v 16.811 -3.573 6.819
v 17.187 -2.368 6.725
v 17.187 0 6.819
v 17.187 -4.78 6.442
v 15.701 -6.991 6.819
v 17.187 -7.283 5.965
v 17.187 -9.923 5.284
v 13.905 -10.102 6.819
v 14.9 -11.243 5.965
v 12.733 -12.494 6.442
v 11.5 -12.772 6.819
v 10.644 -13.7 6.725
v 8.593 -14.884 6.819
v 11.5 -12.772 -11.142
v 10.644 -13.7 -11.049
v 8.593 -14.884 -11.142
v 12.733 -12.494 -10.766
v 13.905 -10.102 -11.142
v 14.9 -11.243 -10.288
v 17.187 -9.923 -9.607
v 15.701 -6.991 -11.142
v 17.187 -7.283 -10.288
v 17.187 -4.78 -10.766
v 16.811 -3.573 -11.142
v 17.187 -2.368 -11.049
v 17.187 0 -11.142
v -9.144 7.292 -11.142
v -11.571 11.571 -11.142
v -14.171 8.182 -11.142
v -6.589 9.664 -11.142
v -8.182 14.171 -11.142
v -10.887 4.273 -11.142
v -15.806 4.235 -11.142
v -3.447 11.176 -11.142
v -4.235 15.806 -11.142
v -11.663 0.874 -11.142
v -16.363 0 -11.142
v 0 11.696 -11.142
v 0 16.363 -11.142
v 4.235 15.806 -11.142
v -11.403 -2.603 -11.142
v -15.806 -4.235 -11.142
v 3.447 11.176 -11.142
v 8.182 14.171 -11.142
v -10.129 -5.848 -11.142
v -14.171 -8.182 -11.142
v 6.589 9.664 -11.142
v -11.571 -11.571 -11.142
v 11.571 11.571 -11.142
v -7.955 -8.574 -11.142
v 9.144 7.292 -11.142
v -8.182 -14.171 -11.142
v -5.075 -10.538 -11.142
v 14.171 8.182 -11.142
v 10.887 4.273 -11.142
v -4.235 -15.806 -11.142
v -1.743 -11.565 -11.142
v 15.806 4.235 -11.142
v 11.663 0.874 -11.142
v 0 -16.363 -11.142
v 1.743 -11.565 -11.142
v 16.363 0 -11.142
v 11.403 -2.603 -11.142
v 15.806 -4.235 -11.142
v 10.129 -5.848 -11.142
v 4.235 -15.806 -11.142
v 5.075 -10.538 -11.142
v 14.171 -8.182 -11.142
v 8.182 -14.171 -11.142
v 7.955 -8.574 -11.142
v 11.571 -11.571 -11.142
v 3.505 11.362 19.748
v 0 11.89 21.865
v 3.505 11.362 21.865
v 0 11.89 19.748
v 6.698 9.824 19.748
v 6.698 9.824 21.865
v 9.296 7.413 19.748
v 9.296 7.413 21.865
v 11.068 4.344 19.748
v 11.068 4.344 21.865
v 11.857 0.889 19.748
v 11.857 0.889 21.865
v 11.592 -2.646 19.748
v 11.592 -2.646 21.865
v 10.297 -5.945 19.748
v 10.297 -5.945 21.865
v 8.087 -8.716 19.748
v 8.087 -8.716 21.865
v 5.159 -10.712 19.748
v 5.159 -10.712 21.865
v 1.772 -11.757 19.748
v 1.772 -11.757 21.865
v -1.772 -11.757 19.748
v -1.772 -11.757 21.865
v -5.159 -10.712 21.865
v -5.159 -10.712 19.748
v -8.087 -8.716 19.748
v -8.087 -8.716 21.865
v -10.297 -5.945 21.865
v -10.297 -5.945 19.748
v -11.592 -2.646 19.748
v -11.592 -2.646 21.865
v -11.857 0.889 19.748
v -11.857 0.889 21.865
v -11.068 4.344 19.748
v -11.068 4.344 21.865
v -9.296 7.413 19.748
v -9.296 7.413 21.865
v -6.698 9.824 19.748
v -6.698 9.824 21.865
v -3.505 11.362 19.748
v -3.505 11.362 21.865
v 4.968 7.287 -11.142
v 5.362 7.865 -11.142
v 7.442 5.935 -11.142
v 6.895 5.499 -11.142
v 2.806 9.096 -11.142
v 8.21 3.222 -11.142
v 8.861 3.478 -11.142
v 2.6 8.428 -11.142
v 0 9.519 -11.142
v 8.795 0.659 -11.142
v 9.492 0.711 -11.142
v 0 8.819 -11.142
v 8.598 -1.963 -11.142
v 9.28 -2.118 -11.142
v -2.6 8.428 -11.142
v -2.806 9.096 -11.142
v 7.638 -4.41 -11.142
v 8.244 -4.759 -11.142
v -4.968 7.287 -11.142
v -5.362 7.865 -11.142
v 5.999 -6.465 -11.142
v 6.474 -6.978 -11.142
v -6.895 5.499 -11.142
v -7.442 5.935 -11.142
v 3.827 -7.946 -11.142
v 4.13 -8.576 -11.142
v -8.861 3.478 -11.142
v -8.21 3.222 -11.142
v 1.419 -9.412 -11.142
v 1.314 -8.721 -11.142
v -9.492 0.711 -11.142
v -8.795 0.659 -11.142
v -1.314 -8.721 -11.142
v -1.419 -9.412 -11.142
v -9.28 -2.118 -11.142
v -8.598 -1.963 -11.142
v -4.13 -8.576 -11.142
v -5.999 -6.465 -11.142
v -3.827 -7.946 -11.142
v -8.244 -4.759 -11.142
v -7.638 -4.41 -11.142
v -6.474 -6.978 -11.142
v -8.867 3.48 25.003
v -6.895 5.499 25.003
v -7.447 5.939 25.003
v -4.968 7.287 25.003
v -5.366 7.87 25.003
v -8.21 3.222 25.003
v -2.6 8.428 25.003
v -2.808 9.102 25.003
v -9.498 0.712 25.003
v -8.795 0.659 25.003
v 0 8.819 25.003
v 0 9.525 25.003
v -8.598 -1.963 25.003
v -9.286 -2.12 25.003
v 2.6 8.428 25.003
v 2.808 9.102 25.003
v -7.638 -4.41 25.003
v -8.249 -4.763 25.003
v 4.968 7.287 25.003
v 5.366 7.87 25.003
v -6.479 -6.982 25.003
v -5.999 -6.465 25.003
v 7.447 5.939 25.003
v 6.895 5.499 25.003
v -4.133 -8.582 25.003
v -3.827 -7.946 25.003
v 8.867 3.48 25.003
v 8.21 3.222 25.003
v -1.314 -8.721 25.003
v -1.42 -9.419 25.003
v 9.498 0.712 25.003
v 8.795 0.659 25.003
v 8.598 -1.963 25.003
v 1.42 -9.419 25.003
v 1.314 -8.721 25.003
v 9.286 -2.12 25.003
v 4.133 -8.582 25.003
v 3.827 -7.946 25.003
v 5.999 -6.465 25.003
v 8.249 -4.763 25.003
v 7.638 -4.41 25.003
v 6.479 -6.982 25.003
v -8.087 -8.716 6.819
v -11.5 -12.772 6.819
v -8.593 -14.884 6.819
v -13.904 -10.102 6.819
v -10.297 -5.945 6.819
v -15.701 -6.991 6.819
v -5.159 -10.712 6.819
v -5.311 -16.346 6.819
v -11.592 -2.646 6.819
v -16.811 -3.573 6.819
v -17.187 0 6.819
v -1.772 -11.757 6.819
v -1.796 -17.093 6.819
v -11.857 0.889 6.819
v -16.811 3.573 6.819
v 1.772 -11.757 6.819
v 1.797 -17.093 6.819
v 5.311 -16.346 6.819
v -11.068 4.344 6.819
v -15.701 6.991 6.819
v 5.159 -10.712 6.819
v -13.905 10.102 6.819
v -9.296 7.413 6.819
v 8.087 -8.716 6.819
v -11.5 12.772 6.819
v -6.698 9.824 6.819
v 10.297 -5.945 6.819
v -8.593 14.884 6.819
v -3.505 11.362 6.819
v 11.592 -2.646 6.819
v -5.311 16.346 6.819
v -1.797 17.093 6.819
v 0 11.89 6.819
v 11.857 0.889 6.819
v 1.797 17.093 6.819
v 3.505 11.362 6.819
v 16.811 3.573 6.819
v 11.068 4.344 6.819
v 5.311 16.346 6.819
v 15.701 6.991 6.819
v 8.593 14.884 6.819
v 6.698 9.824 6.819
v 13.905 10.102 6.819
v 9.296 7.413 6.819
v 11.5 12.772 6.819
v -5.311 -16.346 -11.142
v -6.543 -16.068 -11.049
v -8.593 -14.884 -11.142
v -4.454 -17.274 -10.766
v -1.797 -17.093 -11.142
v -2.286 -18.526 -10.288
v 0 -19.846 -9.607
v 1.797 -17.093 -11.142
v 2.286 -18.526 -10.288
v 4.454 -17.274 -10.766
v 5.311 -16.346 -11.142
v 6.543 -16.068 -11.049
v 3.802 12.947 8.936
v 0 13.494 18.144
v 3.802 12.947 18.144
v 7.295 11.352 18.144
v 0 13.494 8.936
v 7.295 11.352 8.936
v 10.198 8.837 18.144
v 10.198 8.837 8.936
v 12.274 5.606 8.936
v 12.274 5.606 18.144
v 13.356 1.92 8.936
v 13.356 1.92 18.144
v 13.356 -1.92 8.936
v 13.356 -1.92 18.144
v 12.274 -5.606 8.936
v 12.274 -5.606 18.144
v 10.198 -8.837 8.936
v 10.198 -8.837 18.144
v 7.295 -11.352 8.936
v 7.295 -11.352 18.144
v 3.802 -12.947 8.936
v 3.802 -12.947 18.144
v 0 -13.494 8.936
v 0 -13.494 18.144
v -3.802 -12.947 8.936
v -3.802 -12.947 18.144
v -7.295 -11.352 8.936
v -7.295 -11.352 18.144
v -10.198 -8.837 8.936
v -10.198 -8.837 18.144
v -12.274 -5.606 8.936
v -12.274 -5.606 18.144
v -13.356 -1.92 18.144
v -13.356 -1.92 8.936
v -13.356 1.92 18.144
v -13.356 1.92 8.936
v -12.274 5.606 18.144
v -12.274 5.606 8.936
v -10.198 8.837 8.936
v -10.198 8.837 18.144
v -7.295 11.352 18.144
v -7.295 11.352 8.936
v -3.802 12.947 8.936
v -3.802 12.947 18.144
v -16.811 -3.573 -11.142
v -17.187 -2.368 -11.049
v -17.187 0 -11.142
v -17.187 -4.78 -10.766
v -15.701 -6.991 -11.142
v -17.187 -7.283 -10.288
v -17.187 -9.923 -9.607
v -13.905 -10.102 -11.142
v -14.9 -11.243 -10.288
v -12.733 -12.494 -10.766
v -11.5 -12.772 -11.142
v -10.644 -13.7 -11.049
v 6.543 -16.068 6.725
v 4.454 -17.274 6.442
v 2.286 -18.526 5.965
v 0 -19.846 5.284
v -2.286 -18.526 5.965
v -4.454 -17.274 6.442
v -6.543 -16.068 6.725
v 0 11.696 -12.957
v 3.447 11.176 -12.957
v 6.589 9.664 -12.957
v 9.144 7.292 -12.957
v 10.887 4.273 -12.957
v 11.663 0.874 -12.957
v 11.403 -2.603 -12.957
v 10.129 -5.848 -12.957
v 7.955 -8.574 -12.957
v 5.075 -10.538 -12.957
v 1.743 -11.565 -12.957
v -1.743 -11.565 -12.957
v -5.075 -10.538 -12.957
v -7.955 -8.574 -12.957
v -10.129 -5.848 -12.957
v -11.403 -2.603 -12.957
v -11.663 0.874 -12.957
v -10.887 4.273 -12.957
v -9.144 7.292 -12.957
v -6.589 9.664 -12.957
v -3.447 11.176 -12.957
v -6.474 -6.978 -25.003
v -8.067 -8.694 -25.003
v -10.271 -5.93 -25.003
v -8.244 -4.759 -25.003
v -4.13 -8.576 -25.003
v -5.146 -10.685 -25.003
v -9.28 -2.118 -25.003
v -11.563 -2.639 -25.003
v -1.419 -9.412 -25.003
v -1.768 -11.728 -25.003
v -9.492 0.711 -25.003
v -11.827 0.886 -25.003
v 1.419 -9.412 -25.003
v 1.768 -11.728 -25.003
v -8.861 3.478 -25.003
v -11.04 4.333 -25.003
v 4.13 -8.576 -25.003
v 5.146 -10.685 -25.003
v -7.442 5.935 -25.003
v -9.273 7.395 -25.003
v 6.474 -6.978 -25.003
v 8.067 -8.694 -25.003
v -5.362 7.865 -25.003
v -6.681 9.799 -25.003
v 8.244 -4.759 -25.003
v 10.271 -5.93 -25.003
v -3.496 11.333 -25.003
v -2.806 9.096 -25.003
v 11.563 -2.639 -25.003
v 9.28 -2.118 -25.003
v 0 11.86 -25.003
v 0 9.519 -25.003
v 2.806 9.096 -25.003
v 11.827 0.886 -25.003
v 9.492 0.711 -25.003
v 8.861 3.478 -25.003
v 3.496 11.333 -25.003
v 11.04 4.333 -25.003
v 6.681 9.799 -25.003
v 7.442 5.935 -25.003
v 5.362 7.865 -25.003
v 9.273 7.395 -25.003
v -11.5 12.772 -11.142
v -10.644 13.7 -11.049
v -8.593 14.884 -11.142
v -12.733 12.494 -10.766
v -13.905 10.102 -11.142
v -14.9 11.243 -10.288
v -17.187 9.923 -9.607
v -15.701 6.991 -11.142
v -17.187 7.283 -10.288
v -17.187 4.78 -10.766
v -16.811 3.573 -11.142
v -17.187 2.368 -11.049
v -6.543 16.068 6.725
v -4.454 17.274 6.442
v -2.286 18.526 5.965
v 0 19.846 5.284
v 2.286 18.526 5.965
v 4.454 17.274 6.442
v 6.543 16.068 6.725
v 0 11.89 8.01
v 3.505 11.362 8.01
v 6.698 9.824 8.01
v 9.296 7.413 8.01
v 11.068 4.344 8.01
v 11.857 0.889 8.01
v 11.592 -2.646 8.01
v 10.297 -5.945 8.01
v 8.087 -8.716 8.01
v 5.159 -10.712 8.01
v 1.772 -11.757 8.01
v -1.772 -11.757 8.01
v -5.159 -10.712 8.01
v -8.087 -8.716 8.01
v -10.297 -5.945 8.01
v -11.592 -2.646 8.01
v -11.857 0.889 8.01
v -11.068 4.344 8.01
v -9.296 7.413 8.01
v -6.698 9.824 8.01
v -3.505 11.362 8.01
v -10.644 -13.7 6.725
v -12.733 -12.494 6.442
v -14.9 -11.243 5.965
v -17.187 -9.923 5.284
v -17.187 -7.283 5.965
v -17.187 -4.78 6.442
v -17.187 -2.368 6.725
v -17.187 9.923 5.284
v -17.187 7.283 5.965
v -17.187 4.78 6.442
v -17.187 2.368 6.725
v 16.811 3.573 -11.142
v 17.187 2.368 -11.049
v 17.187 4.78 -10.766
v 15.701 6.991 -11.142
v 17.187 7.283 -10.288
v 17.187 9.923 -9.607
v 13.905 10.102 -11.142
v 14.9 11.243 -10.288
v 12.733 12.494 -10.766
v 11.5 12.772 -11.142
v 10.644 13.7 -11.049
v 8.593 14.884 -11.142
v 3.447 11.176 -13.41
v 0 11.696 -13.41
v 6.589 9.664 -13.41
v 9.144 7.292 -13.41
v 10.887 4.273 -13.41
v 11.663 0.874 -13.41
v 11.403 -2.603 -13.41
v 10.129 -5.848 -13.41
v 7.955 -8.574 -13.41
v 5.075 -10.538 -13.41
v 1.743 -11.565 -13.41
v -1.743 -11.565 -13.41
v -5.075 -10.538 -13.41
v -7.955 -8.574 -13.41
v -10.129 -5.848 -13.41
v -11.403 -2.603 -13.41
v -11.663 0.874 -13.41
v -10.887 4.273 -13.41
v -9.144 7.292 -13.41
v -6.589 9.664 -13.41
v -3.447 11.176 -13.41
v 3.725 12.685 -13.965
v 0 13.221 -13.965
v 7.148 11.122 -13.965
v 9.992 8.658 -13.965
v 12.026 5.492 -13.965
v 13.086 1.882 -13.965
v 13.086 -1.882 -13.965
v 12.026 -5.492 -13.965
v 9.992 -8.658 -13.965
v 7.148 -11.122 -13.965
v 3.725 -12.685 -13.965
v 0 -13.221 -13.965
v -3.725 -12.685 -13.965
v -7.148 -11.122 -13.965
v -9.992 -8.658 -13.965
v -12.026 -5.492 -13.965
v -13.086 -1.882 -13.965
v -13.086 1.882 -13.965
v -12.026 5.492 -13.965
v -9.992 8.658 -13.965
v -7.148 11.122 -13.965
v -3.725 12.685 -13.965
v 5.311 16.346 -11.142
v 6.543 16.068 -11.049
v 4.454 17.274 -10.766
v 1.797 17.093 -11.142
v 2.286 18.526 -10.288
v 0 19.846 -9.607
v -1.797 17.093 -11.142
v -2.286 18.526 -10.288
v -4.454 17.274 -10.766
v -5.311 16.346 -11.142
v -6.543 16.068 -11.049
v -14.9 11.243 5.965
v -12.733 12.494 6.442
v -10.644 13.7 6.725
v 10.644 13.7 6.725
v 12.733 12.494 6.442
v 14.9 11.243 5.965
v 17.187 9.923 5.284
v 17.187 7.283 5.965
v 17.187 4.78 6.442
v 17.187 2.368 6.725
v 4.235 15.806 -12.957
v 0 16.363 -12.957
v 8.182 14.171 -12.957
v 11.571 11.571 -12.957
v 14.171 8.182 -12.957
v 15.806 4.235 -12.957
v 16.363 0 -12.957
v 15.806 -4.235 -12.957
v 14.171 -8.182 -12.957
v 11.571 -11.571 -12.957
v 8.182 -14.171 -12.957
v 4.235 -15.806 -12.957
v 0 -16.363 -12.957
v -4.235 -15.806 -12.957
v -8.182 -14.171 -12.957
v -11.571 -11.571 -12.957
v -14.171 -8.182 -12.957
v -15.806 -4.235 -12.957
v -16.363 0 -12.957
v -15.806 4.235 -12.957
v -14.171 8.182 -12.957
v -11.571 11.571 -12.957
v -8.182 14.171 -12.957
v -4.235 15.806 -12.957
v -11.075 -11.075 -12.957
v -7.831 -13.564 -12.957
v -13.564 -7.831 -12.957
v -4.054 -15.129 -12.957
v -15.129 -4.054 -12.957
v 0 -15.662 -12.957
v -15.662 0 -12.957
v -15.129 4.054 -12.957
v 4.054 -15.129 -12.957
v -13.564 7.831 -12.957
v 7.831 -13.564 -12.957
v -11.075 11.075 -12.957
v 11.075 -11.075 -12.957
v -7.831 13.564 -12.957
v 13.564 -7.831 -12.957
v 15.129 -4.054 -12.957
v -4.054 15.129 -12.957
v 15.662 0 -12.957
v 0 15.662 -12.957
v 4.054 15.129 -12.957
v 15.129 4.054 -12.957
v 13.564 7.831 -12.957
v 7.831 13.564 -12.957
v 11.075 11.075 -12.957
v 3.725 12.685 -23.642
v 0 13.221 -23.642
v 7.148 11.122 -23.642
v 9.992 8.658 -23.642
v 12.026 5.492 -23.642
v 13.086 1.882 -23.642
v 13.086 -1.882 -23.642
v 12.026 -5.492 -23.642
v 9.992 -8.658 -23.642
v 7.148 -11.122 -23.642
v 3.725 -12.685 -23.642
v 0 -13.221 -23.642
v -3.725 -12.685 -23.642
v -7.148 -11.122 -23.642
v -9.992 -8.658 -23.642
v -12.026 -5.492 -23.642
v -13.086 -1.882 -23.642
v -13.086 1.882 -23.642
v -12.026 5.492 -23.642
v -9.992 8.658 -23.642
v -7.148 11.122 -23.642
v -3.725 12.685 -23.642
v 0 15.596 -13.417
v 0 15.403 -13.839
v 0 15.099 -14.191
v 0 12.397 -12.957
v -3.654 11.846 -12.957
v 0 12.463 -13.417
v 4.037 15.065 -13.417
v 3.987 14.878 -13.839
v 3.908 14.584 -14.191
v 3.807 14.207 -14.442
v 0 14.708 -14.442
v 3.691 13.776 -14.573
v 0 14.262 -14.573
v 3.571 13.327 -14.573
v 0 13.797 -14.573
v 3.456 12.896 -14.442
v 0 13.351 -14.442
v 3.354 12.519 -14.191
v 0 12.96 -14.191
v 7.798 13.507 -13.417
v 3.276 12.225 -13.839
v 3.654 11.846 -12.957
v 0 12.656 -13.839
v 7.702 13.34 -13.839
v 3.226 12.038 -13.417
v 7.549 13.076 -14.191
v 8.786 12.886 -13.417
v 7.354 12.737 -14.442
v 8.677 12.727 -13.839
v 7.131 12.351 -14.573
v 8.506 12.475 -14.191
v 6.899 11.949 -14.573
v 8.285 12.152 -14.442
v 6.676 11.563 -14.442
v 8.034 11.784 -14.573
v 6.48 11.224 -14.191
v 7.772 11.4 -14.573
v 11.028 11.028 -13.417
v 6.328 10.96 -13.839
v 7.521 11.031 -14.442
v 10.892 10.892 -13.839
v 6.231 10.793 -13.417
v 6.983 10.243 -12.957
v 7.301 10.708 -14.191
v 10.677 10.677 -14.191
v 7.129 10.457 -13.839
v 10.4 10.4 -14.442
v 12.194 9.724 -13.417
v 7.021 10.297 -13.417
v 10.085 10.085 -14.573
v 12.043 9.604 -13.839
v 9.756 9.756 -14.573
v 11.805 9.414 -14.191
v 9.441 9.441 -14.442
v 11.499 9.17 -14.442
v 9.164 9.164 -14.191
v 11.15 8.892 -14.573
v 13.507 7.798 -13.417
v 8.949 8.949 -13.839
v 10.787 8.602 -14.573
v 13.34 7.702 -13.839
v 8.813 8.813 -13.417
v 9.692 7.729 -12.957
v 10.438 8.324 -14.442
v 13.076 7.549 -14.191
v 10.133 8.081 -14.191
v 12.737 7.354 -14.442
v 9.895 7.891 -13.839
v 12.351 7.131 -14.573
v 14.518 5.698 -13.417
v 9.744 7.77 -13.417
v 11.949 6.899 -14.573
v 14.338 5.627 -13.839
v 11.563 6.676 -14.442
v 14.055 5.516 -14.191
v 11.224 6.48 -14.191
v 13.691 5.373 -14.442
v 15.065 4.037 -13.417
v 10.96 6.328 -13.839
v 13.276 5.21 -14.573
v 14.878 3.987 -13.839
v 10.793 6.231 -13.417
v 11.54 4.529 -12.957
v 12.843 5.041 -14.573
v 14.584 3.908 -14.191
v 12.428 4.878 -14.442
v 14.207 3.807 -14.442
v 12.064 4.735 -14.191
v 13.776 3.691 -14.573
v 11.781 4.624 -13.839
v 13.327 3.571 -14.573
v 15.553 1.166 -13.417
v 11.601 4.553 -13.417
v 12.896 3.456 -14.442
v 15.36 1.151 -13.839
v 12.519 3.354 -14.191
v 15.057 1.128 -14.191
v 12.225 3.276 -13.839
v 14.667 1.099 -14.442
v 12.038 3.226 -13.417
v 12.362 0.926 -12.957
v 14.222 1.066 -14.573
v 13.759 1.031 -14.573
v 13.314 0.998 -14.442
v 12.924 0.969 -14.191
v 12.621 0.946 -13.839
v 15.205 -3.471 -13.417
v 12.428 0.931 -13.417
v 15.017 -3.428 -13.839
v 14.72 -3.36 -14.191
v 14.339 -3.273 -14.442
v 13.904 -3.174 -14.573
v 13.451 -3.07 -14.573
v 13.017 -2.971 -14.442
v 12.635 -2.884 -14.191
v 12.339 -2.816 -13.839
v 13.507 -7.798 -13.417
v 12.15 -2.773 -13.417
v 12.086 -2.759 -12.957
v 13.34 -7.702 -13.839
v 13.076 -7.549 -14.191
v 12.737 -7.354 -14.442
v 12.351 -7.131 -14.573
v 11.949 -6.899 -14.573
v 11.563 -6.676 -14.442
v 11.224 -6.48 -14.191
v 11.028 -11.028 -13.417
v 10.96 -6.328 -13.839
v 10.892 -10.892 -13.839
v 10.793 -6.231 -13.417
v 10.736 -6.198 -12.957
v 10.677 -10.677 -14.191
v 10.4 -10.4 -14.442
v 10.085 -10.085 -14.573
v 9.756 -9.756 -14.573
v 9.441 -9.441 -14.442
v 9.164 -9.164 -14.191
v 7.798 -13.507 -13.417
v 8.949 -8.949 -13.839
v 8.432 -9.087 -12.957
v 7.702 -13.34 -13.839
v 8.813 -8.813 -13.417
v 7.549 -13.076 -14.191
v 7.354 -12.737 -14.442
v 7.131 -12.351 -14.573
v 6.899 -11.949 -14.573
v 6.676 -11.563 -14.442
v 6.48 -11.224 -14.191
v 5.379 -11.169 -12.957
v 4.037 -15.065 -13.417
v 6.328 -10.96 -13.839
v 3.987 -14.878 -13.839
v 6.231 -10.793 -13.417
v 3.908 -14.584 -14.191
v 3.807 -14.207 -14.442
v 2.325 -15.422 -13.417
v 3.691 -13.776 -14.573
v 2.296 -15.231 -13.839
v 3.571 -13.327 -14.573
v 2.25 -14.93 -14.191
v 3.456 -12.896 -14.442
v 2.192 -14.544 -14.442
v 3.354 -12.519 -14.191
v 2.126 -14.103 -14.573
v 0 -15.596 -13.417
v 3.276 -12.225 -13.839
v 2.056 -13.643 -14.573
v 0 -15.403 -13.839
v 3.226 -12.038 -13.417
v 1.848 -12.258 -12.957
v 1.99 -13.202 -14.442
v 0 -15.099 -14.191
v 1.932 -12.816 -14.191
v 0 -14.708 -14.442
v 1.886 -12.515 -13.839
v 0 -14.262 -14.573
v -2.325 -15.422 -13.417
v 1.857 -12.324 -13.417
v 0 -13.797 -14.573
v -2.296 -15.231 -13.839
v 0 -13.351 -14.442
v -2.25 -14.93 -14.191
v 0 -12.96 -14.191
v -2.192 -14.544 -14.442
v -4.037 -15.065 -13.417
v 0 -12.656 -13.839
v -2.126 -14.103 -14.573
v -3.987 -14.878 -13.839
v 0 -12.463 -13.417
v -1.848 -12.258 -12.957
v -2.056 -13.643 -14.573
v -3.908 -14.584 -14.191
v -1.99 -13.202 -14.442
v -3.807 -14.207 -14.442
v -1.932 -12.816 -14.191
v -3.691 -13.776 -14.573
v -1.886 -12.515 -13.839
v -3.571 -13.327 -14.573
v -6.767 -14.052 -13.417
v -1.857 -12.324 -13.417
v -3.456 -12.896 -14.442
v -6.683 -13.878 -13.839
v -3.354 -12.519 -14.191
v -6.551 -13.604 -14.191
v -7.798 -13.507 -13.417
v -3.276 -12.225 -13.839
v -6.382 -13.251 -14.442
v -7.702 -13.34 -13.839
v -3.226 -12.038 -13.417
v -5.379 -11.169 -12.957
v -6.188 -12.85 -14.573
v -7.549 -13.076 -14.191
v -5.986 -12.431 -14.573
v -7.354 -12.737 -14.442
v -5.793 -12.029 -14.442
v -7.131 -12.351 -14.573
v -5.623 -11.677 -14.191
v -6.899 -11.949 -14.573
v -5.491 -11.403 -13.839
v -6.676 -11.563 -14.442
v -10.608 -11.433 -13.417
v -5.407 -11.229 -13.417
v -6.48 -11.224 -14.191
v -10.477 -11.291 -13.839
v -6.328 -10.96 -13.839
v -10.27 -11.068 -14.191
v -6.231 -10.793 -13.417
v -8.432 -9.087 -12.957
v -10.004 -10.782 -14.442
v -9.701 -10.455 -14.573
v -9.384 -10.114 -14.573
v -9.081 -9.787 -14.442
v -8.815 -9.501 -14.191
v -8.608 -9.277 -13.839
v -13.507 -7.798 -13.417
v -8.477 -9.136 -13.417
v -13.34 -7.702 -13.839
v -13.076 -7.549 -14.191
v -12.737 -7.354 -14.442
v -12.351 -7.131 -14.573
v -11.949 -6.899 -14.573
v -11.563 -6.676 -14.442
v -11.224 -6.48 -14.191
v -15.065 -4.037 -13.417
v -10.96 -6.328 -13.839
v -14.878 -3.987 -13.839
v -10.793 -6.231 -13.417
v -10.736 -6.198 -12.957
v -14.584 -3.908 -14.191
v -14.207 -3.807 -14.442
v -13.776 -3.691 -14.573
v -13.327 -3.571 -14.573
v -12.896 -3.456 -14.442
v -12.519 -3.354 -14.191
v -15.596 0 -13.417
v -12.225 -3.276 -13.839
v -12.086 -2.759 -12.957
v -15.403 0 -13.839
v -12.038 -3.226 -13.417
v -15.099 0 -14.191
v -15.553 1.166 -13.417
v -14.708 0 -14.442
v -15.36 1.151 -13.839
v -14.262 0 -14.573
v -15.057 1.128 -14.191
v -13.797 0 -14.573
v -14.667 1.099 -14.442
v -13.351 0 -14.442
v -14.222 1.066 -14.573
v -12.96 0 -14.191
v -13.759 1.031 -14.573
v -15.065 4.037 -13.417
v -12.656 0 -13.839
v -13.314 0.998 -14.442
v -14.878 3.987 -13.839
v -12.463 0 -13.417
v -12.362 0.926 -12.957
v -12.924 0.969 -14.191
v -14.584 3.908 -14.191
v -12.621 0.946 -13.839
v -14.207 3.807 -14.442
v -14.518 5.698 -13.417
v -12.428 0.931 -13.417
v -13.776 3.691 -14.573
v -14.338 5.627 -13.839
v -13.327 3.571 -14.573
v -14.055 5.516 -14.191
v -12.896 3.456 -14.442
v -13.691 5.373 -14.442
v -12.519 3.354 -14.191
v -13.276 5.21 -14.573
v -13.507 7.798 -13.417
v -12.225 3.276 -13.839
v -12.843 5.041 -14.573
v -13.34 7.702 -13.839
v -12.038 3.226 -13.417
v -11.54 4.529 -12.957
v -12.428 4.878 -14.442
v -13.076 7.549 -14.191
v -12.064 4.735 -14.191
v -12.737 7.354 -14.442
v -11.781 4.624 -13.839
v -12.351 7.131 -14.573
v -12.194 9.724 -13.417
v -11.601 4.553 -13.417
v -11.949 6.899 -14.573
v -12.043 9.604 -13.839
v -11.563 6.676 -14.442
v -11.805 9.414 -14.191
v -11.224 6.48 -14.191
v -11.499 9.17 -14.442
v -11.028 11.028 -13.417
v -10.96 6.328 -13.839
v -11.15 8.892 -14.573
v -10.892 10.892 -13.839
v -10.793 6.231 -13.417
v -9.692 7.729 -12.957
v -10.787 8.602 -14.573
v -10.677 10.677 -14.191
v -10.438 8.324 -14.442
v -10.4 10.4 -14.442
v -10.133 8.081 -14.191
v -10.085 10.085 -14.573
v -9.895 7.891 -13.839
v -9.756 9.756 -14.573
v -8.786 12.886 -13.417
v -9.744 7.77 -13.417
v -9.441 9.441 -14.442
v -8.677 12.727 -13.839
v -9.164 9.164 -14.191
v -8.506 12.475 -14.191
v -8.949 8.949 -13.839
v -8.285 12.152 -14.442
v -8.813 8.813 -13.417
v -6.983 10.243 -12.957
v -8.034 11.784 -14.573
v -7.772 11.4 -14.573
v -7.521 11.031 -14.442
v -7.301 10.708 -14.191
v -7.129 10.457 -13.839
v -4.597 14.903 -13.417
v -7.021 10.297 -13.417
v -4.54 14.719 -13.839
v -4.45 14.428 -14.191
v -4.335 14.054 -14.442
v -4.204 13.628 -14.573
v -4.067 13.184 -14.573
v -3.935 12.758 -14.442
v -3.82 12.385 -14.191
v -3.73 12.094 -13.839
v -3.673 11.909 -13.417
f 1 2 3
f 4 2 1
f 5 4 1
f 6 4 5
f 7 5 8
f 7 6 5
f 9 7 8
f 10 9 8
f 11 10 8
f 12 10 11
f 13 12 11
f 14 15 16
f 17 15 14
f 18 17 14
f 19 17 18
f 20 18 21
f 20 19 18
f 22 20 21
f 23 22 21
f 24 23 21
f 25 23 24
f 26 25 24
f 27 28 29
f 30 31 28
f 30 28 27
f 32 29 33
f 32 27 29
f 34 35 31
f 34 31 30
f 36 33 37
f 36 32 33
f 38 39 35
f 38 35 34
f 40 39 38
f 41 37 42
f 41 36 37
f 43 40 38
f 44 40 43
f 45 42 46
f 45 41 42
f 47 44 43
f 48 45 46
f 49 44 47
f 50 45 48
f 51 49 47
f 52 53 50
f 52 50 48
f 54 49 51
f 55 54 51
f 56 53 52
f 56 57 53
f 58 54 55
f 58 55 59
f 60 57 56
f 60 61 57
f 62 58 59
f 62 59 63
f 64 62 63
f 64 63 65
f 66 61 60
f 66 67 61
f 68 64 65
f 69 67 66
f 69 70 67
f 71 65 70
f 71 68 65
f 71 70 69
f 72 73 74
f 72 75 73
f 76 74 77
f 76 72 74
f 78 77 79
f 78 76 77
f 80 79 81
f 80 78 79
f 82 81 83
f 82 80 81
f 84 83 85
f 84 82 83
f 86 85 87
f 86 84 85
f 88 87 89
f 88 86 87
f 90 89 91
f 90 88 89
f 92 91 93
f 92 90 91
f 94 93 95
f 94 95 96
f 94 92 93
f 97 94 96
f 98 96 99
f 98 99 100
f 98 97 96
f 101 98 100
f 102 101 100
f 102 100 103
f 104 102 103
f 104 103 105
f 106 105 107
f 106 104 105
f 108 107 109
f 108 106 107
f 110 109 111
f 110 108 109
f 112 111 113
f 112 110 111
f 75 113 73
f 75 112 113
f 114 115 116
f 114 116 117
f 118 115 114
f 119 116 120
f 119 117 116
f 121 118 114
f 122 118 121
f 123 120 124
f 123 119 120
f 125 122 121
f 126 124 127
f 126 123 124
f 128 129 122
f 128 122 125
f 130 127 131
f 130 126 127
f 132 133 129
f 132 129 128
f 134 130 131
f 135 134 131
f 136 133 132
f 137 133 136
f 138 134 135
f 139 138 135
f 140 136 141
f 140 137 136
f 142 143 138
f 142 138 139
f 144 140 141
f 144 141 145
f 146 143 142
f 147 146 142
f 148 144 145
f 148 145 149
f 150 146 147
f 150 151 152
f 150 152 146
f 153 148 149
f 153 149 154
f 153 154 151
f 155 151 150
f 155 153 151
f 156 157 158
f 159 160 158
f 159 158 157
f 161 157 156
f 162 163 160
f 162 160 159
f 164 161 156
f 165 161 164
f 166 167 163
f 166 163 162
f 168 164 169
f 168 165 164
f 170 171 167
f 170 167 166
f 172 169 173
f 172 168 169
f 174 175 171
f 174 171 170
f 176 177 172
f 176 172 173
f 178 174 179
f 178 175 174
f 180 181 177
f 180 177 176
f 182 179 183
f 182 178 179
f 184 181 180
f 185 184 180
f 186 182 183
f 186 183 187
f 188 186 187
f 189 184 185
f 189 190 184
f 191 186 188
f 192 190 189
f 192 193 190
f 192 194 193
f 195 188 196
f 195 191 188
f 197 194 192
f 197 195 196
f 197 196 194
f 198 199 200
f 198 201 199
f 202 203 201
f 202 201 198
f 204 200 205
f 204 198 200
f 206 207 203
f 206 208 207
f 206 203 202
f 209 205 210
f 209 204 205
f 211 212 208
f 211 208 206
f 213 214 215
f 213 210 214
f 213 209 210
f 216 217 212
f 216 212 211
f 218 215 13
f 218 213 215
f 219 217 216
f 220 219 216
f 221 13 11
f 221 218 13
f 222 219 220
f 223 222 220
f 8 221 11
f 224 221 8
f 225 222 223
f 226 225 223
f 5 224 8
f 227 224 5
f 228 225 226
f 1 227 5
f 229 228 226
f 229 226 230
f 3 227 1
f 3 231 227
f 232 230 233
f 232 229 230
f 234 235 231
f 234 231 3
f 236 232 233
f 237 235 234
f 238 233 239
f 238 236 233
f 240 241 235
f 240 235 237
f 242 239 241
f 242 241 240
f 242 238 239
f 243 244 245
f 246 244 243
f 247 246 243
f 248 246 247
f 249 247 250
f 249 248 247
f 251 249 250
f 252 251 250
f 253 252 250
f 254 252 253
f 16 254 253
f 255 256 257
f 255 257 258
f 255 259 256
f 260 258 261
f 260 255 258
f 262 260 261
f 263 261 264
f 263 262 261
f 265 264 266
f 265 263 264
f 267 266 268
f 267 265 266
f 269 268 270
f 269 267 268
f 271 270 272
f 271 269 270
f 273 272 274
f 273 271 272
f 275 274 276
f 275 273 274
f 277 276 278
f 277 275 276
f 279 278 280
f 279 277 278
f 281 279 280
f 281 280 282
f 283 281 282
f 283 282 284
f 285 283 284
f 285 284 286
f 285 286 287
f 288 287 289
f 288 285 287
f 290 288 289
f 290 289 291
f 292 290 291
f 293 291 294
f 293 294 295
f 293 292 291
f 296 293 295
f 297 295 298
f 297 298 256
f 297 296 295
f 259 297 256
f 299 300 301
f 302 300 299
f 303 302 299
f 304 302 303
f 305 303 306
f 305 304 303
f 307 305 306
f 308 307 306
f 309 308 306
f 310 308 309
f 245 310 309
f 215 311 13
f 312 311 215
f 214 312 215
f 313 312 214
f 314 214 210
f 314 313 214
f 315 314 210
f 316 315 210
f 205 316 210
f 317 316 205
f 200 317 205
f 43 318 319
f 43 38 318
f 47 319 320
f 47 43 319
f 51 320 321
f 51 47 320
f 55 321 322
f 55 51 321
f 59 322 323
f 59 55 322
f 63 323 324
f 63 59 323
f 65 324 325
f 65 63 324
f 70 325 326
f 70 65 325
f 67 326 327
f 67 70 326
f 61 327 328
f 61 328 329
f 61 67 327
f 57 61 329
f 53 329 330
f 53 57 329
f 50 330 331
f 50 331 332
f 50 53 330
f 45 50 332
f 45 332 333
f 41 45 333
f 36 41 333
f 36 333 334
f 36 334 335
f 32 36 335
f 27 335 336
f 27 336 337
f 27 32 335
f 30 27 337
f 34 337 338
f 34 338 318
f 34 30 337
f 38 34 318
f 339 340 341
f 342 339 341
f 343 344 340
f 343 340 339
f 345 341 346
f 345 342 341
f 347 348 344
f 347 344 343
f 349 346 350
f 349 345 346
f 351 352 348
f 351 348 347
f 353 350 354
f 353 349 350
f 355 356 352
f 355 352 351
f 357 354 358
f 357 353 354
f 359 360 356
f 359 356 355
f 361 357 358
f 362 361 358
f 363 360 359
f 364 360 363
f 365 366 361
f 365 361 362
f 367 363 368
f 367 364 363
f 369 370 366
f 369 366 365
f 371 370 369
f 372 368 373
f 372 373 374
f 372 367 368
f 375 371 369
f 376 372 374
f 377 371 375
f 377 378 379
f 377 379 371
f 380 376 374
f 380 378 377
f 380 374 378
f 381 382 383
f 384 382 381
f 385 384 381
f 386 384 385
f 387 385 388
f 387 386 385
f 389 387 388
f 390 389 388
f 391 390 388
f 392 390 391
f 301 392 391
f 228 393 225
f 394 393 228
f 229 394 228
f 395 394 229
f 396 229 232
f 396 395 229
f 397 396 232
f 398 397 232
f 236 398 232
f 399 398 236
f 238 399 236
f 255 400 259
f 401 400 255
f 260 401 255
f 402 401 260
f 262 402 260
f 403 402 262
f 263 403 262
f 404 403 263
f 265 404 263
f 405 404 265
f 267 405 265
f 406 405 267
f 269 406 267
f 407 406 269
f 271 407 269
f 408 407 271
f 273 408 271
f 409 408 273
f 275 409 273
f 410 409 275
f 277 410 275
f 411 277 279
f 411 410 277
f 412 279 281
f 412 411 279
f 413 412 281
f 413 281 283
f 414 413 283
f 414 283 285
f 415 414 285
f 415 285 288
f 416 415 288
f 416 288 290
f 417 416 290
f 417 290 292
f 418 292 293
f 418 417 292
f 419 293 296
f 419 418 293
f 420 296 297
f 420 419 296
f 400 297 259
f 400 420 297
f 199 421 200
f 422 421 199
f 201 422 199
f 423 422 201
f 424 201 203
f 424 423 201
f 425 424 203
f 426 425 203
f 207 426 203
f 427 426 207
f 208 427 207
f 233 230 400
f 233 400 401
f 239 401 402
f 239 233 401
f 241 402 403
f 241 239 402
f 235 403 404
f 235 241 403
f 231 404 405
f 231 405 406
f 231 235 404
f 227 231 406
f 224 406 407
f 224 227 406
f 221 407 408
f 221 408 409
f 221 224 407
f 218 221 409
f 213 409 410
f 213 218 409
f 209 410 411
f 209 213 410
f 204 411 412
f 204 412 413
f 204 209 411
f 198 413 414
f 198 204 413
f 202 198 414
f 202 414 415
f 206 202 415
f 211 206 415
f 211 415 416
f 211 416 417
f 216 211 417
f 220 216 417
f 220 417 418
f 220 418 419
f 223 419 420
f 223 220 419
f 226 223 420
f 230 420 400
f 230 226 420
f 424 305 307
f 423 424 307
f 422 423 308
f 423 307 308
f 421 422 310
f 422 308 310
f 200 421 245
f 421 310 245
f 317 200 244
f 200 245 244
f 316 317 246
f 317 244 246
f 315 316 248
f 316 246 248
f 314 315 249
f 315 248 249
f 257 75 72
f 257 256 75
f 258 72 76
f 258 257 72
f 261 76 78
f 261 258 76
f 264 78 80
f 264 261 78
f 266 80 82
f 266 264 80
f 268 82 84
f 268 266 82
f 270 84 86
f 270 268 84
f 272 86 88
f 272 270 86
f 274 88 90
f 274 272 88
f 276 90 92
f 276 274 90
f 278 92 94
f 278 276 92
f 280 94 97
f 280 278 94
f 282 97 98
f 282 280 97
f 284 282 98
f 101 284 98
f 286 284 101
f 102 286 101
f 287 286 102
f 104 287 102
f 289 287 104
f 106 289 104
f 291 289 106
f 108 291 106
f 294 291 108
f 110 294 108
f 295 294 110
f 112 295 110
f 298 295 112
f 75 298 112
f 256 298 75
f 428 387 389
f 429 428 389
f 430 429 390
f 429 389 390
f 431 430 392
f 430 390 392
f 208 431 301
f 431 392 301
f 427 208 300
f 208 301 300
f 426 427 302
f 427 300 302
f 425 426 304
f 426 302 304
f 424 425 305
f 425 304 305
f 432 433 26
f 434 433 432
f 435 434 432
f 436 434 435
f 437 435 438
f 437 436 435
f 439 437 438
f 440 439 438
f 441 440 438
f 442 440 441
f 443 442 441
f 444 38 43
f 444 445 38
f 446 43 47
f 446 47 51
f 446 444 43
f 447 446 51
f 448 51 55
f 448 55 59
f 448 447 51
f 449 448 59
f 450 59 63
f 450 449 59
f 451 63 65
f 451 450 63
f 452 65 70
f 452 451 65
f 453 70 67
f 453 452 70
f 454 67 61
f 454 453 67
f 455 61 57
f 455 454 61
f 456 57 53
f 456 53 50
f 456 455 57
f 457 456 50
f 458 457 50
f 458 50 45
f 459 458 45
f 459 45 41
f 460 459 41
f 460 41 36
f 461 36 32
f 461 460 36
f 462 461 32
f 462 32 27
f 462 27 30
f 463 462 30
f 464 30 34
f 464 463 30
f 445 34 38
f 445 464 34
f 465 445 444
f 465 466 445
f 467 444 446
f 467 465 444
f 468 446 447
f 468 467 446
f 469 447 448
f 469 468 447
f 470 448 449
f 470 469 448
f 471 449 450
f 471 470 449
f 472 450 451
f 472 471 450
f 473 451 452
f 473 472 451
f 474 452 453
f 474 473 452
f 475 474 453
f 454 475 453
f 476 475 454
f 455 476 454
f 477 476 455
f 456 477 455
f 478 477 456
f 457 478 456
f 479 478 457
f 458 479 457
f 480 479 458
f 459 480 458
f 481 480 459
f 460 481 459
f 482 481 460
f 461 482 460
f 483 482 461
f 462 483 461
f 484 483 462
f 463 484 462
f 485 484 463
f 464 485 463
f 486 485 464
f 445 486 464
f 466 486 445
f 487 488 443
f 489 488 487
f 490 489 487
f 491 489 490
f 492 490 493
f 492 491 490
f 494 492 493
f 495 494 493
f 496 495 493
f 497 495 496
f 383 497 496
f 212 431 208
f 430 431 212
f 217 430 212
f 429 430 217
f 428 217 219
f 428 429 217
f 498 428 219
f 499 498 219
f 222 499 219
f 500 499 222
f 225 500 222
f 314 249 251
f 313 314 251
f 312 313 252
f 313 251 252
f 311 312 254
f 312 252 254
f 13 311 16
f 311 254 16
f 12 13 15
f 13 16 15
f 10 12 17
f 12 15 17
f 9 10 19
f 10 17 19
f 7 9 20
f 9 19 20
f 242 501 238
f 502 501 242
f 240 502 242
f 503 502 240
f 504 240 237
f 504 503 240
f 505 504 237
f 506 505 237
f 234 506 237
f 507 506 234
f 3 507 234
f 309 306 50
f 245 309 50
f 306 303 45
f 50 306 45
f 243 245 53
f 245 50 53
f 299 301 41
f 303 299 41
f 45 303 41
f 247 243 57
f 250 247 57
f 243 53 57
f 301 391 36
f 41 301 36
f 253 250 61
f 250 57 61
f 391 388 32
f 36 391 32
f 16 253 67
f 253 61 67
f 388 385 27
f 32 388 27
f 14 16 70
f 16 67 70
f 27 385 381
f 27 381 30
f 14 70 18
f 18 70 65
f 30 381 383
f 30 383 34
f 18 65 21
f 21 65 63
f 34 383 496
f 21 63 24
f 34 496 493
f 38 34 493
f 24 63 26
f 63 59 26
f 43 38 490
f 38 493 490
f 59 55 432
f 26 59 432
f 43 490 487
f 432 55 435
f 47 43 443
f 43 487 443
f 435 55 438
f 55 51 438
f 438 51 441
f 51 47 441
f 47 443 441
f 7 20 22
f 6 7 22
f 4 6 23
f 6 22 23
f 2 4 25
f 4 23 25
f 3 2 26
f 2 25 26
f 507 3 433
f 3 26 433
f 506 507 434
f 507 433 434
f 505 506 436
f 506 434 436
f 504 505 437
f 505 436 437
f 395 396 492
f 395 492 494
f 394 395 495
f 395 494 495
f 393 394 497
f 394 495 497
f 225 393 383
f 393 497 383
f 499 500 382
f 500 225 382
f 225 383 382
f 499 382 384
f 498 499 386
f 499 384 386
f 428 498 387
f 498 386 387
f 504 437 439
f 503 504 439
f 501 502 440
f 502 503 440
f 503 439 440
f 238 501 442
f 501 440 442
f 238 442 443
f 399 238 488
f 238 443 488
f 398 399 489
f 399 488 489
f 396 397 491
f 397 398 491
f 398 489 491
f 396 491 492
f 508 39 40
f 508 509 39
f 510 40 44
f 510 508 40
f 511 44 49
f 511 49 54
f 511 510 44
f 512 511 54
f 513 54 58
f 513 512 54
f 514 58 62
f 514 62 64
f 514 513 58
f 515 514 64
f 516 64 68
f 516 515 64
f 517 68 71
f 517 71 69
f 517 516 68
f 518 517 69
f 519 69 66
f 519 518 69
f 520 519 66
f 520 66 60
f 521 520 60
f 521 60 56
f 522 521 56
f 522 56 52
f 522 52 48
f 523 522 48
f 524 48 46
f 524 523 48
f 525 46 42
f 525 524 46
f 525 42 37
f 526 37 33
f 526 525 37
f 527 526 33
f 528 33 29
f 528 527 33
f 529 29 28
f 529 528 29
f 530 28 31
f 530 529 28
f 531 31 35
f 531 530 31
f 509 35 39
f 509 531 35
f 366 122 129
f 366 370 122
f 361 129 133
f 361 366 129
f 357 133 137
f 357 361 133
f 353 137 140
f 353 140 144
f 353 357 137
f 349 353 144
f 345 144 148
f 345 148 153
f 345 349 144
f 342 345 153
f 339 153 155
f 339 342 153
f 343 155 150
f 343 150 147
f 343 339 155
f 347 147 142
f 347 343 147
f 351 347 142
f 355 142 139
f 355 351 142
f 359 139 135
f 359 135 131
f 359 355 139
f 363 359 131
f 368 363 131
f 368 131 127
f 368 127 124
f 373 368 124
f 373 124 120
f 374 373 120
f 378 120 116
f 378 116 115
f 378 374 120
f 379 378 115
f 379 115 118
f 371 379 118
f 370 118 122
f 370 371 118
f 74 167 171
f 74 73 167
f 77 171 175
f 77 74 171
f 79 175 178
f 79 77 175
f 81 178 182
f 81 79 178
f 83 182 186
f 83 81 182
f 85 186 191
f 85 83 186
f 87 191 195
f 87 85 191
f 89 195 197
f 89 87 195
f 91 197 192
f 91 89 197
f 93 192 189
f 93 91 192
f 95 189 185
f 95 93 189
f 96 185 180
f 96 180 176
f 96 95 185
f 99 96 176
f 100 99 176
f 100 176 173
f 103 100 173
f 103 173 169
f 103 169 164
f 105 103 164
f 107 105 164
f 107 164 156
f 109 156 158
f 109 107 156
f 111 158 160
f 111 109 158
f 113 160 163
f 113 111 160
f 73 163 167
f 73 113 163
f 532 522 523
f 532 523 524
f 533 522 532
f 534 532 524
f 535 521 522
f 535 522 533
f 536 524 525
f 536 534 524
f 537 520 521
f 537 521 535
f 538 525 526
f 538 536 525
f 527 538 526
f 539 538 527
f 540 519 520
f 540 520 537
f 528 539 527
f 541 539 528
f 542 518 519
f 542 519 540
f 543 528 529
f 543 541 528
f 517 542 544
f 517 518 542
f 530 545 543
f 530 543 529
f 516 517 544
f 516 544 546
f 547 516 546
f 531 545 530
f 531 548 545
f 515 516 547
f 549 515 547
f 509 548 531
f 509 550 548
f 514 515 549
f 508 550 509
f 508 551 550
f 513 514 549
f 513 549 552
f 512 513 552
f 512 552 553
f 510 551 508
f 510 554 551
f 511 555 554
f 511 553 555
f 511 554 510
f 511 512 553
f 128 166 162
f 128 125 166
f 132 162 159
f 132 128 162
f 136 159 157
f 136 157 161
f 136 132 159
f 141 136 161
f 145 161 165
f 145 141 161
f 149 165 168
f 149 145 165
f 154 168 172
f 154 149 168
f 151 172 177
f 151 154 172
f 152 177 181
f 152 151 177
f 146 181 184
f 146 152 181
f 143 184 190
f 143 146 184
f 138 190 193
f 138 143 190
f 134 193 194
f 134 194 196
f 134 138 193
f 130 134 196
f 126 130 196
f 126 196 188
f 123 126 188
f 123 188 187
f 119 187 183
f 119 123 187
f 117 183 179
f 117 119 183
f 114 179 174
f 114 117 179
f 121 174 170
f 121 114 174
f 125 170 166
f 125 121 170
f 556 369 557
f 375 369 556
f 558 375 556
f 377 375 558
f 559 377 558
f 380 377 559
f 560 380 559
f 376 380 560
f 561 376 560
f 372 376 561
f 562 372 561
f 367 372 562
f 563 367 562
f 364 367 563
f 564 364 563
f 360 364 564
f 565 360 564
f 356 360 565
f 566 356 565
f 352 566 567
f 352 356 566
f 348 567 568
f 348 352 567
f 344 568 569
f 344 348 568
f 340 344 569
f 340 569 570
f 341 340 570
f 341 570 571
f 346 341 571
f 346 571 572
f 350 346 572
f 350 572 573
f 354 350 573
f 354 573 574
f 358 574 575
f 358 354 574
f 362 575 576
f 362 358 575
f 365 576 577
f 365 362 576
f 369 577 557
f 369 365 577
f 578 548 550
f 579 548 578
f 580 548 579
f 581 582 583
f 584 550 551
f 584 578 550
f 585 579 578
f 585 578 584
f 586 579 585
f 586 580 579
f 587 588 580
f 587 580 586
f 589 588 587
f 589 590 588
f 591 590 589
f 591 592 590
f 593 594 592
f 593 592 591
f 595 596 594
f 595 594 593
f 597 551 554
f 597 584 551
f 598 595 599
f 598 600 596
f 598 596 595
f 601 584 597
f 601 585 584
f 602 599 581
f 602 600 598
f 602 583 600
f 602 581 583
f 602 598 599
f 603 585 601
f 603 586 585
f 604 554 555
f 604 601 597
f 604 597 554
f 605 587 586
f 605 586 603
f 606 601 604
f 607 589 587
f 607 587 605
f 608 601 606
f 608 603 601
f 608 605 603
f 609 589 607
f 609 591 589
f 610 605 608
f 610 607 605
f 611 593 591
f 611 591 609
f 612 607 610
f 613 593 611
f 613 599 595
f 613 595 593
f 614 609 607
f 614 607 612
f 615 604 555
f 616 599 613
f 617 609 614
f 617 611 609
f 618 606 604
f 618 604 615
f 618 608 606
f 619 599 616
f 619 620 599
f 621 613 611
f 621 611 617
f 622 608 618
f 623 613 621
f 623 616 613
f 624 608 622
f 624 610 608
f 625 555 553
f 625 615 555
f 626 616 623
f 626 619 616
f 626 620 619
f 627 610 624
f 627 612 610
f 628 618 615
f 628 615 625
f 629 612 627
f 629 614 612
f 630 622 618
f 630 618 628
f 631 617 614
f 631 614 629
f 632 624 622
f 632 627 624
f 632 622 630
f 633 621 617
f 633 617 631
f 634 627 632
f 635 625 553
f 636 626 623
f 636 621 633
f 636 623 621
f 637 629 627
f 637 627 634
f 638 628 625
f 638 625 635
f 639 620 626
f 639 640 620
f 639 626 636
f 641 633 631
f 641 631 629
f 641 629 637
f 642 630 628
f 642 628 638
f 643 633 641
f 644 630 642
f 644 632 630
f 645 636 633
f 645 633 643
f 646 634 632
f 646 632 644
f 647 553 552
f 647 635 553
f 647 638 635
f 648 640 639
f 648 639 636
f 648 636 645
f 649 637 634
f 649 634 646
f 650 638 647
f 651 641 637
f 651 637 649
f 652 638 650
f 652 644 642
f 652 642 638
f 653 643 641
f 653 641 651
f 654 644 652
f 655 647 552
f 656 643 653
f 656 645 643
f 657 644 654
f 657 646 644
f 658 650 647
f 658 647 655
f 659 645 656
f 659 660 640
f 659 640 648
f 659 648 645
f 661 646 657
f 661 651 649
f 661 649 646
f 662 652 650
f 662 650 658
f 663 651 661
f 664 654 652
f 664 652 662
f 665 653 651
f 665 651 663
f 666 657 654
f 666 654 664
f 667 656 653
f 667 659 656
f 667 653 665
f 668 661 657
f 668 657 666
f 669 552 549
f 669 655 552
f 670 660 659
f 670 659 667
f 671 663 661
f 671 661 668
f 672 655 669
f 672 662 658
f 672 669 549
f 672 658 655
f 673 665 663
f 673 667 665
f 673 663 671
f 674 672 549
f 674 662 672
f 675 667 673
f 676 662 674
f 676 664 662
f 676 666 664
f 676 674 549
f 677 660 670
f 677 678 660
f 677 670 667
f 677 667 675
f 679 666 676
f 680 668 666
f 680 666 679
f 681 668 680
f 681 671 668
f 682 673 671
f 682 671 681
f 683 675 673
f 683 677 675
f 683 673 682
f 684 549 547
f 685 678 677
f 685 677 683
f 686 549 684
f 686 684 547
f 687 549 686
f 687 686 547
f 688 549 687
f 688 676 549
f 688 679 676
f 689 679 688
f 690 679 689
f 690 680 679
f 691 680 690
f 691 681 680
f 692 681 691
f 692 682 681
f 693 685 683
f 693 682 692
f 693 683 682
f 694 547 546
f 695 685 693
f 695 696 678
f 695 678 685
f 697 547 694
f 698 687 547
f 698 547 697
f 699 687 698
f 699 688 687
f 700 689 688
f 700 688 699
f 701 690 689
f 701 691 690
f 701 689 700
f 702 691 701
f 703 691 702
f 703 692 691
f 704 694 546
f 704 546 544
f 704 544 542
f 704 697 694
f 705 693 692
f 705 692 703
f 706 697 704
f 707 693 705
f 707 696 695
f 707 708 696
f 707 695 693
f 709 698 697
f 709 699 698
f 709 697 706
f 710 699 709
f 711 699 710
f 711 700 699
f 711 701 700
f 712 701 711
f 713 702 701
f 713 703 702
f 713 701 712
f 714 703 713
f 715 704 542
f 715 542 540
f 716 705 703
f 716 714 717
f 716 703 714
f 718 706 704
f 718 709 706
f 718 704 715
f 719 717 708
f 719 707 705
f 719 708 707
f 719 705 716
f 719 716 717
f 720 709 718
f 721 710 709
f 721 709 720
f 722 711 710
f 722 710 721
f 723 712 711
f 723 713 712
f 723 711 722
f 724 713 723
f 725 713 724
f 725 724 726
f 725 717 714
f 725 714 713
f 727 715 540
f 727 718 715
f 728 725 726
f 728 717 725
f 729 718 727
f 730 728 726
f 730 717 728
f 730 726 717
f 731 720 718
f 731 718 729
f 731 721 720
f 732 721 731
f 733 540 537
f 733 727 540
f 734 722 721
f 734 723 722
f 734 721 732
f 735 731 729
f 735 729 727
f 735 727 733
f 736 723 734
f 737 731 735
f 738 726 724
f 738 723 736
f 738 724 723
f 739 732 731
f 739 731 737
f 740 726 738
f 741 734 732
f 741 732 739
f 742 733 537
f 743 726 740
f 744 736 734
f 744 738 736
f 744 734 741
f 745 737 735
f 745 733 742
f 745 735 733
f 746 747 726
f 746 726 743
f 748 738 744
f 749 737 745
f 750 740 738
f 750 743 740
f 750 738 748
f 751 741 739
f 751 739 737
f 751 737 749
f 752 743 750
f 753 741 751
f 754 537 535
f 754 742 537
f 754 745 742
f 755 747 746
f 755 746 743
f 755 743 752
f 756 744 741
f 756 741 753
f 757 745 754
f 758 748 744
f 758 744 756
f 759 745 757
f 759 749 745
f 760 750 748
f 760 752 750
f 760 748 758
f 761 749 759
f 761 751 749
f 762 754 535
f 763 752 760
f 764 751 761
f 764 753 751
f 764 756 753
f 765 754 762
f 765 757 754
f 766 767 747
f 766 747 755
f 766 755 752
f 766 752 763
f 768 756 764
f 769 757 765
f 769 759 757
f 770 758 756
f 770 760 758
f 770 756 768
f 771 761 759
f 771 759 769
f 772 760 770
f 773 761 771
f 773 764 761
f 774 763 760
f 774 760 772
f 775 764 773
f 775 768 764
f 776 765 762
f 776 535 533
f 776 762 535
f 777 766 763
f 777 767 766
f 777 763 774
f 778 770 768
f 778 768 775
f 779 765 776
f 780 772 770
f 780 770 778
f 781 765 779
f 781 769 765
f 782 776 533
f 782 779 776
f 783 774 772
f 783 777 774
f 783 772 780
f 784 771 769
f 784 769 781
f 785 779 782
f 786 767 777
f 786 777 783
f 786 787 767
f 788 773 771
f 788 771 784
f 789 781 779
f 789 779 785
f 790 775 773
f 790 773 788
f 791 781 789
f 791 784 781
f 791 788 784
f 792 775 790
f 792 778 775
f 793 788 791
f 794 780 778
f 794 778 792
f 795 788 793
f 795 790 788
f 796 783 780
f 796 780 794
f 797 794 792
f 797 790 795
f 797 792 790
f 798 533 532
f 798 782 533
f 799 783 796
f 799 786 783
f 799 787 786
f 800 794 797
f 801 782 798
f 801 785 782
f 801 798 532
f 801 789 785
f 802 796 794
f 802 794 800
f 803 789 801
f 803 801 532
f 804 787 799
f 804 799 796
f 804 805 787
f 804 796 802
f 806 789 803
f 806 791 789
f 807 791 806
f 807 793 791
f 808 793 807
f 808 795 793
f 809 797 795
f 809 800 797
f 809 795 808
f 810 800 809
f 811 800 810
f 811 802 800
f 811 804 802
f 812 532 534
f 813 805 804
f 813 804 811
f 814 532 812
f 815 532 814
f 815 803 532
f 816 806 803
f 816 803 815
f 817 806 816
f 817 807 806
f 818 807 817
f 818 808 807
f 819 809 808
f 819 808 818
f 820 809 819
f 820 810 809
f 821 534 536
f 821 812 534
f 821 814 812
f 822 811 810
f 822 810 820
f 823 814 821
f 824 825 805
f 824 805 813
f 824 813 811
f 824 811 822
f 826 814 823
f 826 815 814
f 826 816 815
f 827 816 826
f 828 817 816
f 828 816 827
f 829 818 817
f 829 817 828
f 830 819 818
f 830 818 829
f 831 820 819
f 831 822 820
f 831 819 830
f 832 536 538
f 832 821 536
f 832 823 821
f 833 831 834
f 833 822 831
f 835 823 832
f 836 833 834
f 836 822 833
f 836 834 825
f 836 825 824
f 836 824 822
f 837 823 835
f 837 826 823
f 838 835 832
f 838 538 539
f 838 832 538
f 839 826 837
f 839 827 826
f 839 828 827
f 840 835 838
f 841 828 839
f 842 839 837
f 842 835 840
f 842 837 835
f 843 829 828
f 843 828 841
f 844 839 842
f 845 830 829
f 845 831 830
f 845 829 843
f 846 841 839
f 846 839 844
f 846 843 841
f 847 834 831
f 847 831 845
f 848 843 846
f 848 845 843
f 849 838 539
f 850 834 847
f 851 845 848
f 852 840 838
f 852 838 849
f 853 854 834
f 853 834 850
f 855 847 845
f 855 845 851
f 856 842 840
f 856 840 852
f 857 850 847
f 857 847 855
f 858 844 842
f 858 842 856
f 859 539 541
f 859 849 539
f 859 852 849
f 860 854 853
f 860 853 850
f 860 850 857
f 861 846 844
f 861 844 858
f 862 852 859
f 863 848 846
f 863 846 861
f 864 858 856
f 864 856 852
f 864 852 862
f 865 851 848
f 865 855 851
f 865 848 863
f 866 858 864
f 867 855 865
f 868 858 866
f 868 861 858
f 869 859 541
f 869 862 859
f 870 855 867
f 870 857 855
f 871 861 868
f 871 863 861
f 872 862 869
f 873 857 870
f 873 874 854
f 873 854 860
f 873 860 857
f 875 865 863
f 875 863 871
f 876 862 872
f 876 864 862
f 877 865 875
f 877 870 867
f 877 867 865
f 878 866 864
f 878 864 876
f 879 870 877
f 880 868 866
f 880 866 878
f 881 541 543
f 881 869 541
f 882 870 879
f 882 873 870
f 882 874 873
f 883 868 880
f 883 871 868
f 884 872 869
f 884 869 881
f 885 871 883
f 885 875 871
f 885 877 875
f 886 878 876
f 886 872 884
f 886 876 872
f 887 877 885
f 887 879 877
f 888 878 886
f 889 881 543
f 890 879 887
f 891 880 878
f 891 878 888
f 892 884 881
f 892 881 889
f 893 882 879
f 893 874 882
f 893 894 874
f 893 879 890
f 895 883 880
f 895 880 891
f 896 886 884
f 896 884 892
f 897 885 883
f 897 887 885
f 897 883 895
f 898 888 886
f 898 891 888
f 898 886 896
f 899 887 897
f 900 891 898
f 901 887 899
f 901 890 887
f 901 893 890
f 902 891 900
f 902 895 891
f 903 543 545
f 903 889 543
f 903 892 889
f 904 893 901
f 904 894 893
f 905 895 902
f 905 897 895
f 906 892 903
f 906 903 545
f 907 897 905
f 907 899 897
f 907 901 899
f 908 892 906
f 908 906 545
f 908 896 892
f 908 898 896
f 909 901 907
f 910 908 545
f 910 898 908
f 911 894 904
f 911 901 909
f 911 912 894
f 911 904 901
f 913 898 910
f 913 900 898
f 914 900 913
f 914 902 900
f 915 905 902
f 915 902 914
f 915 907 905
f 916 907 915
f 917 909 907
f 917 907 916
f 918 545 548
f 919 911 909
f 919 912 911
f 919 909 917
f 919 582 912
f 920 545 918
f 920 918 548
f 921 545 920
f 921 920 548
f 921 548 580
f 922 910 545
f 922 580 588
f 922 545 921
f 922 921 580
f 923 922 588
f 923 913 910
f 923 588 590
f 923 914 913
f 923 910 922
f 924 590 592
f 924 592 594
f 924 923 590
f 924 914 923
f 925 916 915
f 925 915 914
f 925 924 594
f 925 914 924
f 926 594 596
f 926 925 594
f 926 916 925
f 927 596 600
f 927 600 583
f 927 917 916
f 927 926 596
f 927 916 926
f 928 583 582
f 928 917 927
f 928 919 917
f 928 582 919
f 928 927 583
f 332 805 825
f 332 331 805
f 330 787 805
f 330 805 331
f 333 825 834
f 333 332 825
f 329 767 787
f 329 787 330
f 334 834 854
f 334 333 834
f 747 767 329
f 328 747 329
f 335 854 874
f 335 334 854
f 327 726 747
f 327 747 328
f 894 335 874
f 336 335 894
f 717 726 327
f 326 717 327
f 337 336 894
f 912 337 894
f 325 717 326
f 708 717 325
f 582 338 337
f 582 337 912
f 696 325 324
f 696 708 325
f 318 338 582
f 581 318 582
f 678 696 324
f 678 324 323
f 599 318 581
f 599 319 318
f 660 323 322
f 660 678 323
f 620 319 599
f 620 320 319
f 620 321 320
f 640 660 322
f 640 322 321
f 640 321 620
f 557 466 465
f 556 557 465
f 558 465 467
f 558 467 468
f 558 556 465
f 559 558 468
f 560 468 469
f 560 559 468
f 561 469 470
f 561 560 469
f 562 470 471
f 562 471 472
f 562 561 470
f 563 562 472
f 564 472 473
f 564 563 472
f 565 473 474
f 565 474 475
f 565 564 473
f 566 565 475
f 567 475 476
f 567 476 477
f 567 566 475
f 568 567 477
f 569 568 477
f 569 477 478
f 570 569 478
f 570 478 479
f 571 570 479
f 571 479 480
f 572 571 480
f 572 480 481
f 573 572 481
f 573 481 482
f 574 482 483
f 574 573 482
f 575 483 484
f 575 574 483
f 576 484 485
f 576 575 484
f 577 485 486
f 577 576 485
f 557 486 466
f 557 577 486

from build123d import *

# Parameters (mm, degrees)
BOSS_EXTRUDE1_START = -11.142345
BOSS_EXTRUDE1_DEPTH = 17.961379
SKETCH3_OUTSIDE_W   = 113.156
SKETCH3_OUTSIDE_H   = 118.474
SKETCH3_OUTSIDE_R   = 17.18691
CUT_EXTRUDE1_DEPTH  = 18.961379091
CUT_EXTRUDE1_TAPER  = 60
SKETCH4_OUTSIDE_W   = 113.156
SKETCH4_OUTSIDE_H   = 118.474
SKETCH4_OUTSIDE_R   = 17.18691
CUT_EXTRUDE2_DEPTH  = 18.961379091
CUT_EXTRUDE2_TAPER  = 60


with BuildPart() as part:
    # Sketch2 → Boss-Extrude1 (new body)
    with BuildSketch(Plane.XY.offset(BOSS_EXTRUDE1_START)):
        Polygon((0, 19.84573423), (-17.18691, 9.922867115), (-17.18691, -9.922867115), (0, -19.84573423), (17.18691, -9.922867115), (17.18691, 9.922867115), align=None)
    extrude(amount=BOSS_EXTRUDE1_DEPTH)

    # Sketch3 outside → Cut-Extrude1 (cut, through all)
    with BuildSketch(Plane.XY.offset(6.819034091)):
        Rectangle(SKETCH3_OUTSIDE_W, SKETCH3_OUTSIDE_H)
        Circle(SKETCH3_OUTSIDE_R, mode=Mode.SUBTRACT)
    extrude(amount=-CUT_EXTRUDE1_DEPTH, taper=CUT_EXTRUDE1_TAPER, mode=Mode.SUBTRACT)

    # Sketch4 outside → Cut-Extrude2 (cut, through all)
    with BuildSketch(Plane(origin=(0, 0, -11.142345), x_dir=(-1, 0, 0), z_dir=(0, 0, -1))):
        Rectangle(SKETCH4_OUTSIDE_W, SKETCH4_OUTSIDE_H)
        Circle(SKETCH4_OUTSIDE_R, mode=Mode.SUBTRACT)
    extrude(amount=-CUT_EXTRUDE2_DEPTH, taper=CUT_EXTRUDE2_TAPER, mode=Mode.SUBTRACT)

    # Sketch5 → Revolve1 (revolve)
    with BuildSketch(Plane(origin=(0, 0, 0), x_dir=(0, 0, -1), z_dir=(1, 0, 0))):
        Polygon((-25.003125, 0), (-25.003125, 9.525), (-21.86493102, 11.889798783), (-19.748264354, 11.889798783), (-18.144313137, 13.49375), (-8.935700758, 13.49375), (-8.009659091, 11.889798783), (2.161655455, 11.889798783), (2.161655455, 13.2207), (11.142345, 13.2207), (11.142345, 11.695920437), (13.410202143, 11.695920437), (13.965176518, 13.2207), (23.642410714, 13.2207), (25.003125, 11.859985714), (25.003125, 0), align=None)
    revolve(axis=Axis((0, 0, 25.003125), (0, 0, -1)))

    # Sketch6 → Cut-Revolve1 (revolve, cut)
    with BuildSketch(Plane(origin=(0, 0, 0), x_dir=(0, 0, -1), z_dir=(1, 0, 0))):
        Polygon((-25.003125, 8.819444444), (11.142345, 8.819444444), (11.142345, 9.51877758), (25.003125, 9.51877758), (25.003125, 0), (-25.003125, 0), align=None)
    revolve(axis=Axis((0, 0, -25.003125), (0, 0, 1)), mode=Mode.SUBTRACT)


with BuildPart() as body_2:
    # Sketch11 → Revolve2 (revolve)
    with BuildSketch(Plane(origin=(0, 0, 0), x_dir=(0, 0, -1), z_dir=(1, 0, 0))):
        with BuildLine():
            Line((11.142345, 11.695920437), (11.142345, 16.363261566))
            Line((11.142345, 16.363261566), (12.956630714, 16.363261566))
            Line((12.956630714, 16.363261566), (12.956630714, 15.662448144))
            ThreePointArc((12.956630714, 15.662448144), (14.589487857, 14.029591001), (12.956630714, 12.396733858))
            Line((12.956630714, 12.396733858), (12.956630714, 11.695920437))
            Line((12.956630714, 11.695920437), (11.142345, 11.695920437))
        make_face()
    revolve(axis=Axis((0, 0, 25.003125), (0, 0, -1)))


solid = Compound([part.part, body_2.part])
